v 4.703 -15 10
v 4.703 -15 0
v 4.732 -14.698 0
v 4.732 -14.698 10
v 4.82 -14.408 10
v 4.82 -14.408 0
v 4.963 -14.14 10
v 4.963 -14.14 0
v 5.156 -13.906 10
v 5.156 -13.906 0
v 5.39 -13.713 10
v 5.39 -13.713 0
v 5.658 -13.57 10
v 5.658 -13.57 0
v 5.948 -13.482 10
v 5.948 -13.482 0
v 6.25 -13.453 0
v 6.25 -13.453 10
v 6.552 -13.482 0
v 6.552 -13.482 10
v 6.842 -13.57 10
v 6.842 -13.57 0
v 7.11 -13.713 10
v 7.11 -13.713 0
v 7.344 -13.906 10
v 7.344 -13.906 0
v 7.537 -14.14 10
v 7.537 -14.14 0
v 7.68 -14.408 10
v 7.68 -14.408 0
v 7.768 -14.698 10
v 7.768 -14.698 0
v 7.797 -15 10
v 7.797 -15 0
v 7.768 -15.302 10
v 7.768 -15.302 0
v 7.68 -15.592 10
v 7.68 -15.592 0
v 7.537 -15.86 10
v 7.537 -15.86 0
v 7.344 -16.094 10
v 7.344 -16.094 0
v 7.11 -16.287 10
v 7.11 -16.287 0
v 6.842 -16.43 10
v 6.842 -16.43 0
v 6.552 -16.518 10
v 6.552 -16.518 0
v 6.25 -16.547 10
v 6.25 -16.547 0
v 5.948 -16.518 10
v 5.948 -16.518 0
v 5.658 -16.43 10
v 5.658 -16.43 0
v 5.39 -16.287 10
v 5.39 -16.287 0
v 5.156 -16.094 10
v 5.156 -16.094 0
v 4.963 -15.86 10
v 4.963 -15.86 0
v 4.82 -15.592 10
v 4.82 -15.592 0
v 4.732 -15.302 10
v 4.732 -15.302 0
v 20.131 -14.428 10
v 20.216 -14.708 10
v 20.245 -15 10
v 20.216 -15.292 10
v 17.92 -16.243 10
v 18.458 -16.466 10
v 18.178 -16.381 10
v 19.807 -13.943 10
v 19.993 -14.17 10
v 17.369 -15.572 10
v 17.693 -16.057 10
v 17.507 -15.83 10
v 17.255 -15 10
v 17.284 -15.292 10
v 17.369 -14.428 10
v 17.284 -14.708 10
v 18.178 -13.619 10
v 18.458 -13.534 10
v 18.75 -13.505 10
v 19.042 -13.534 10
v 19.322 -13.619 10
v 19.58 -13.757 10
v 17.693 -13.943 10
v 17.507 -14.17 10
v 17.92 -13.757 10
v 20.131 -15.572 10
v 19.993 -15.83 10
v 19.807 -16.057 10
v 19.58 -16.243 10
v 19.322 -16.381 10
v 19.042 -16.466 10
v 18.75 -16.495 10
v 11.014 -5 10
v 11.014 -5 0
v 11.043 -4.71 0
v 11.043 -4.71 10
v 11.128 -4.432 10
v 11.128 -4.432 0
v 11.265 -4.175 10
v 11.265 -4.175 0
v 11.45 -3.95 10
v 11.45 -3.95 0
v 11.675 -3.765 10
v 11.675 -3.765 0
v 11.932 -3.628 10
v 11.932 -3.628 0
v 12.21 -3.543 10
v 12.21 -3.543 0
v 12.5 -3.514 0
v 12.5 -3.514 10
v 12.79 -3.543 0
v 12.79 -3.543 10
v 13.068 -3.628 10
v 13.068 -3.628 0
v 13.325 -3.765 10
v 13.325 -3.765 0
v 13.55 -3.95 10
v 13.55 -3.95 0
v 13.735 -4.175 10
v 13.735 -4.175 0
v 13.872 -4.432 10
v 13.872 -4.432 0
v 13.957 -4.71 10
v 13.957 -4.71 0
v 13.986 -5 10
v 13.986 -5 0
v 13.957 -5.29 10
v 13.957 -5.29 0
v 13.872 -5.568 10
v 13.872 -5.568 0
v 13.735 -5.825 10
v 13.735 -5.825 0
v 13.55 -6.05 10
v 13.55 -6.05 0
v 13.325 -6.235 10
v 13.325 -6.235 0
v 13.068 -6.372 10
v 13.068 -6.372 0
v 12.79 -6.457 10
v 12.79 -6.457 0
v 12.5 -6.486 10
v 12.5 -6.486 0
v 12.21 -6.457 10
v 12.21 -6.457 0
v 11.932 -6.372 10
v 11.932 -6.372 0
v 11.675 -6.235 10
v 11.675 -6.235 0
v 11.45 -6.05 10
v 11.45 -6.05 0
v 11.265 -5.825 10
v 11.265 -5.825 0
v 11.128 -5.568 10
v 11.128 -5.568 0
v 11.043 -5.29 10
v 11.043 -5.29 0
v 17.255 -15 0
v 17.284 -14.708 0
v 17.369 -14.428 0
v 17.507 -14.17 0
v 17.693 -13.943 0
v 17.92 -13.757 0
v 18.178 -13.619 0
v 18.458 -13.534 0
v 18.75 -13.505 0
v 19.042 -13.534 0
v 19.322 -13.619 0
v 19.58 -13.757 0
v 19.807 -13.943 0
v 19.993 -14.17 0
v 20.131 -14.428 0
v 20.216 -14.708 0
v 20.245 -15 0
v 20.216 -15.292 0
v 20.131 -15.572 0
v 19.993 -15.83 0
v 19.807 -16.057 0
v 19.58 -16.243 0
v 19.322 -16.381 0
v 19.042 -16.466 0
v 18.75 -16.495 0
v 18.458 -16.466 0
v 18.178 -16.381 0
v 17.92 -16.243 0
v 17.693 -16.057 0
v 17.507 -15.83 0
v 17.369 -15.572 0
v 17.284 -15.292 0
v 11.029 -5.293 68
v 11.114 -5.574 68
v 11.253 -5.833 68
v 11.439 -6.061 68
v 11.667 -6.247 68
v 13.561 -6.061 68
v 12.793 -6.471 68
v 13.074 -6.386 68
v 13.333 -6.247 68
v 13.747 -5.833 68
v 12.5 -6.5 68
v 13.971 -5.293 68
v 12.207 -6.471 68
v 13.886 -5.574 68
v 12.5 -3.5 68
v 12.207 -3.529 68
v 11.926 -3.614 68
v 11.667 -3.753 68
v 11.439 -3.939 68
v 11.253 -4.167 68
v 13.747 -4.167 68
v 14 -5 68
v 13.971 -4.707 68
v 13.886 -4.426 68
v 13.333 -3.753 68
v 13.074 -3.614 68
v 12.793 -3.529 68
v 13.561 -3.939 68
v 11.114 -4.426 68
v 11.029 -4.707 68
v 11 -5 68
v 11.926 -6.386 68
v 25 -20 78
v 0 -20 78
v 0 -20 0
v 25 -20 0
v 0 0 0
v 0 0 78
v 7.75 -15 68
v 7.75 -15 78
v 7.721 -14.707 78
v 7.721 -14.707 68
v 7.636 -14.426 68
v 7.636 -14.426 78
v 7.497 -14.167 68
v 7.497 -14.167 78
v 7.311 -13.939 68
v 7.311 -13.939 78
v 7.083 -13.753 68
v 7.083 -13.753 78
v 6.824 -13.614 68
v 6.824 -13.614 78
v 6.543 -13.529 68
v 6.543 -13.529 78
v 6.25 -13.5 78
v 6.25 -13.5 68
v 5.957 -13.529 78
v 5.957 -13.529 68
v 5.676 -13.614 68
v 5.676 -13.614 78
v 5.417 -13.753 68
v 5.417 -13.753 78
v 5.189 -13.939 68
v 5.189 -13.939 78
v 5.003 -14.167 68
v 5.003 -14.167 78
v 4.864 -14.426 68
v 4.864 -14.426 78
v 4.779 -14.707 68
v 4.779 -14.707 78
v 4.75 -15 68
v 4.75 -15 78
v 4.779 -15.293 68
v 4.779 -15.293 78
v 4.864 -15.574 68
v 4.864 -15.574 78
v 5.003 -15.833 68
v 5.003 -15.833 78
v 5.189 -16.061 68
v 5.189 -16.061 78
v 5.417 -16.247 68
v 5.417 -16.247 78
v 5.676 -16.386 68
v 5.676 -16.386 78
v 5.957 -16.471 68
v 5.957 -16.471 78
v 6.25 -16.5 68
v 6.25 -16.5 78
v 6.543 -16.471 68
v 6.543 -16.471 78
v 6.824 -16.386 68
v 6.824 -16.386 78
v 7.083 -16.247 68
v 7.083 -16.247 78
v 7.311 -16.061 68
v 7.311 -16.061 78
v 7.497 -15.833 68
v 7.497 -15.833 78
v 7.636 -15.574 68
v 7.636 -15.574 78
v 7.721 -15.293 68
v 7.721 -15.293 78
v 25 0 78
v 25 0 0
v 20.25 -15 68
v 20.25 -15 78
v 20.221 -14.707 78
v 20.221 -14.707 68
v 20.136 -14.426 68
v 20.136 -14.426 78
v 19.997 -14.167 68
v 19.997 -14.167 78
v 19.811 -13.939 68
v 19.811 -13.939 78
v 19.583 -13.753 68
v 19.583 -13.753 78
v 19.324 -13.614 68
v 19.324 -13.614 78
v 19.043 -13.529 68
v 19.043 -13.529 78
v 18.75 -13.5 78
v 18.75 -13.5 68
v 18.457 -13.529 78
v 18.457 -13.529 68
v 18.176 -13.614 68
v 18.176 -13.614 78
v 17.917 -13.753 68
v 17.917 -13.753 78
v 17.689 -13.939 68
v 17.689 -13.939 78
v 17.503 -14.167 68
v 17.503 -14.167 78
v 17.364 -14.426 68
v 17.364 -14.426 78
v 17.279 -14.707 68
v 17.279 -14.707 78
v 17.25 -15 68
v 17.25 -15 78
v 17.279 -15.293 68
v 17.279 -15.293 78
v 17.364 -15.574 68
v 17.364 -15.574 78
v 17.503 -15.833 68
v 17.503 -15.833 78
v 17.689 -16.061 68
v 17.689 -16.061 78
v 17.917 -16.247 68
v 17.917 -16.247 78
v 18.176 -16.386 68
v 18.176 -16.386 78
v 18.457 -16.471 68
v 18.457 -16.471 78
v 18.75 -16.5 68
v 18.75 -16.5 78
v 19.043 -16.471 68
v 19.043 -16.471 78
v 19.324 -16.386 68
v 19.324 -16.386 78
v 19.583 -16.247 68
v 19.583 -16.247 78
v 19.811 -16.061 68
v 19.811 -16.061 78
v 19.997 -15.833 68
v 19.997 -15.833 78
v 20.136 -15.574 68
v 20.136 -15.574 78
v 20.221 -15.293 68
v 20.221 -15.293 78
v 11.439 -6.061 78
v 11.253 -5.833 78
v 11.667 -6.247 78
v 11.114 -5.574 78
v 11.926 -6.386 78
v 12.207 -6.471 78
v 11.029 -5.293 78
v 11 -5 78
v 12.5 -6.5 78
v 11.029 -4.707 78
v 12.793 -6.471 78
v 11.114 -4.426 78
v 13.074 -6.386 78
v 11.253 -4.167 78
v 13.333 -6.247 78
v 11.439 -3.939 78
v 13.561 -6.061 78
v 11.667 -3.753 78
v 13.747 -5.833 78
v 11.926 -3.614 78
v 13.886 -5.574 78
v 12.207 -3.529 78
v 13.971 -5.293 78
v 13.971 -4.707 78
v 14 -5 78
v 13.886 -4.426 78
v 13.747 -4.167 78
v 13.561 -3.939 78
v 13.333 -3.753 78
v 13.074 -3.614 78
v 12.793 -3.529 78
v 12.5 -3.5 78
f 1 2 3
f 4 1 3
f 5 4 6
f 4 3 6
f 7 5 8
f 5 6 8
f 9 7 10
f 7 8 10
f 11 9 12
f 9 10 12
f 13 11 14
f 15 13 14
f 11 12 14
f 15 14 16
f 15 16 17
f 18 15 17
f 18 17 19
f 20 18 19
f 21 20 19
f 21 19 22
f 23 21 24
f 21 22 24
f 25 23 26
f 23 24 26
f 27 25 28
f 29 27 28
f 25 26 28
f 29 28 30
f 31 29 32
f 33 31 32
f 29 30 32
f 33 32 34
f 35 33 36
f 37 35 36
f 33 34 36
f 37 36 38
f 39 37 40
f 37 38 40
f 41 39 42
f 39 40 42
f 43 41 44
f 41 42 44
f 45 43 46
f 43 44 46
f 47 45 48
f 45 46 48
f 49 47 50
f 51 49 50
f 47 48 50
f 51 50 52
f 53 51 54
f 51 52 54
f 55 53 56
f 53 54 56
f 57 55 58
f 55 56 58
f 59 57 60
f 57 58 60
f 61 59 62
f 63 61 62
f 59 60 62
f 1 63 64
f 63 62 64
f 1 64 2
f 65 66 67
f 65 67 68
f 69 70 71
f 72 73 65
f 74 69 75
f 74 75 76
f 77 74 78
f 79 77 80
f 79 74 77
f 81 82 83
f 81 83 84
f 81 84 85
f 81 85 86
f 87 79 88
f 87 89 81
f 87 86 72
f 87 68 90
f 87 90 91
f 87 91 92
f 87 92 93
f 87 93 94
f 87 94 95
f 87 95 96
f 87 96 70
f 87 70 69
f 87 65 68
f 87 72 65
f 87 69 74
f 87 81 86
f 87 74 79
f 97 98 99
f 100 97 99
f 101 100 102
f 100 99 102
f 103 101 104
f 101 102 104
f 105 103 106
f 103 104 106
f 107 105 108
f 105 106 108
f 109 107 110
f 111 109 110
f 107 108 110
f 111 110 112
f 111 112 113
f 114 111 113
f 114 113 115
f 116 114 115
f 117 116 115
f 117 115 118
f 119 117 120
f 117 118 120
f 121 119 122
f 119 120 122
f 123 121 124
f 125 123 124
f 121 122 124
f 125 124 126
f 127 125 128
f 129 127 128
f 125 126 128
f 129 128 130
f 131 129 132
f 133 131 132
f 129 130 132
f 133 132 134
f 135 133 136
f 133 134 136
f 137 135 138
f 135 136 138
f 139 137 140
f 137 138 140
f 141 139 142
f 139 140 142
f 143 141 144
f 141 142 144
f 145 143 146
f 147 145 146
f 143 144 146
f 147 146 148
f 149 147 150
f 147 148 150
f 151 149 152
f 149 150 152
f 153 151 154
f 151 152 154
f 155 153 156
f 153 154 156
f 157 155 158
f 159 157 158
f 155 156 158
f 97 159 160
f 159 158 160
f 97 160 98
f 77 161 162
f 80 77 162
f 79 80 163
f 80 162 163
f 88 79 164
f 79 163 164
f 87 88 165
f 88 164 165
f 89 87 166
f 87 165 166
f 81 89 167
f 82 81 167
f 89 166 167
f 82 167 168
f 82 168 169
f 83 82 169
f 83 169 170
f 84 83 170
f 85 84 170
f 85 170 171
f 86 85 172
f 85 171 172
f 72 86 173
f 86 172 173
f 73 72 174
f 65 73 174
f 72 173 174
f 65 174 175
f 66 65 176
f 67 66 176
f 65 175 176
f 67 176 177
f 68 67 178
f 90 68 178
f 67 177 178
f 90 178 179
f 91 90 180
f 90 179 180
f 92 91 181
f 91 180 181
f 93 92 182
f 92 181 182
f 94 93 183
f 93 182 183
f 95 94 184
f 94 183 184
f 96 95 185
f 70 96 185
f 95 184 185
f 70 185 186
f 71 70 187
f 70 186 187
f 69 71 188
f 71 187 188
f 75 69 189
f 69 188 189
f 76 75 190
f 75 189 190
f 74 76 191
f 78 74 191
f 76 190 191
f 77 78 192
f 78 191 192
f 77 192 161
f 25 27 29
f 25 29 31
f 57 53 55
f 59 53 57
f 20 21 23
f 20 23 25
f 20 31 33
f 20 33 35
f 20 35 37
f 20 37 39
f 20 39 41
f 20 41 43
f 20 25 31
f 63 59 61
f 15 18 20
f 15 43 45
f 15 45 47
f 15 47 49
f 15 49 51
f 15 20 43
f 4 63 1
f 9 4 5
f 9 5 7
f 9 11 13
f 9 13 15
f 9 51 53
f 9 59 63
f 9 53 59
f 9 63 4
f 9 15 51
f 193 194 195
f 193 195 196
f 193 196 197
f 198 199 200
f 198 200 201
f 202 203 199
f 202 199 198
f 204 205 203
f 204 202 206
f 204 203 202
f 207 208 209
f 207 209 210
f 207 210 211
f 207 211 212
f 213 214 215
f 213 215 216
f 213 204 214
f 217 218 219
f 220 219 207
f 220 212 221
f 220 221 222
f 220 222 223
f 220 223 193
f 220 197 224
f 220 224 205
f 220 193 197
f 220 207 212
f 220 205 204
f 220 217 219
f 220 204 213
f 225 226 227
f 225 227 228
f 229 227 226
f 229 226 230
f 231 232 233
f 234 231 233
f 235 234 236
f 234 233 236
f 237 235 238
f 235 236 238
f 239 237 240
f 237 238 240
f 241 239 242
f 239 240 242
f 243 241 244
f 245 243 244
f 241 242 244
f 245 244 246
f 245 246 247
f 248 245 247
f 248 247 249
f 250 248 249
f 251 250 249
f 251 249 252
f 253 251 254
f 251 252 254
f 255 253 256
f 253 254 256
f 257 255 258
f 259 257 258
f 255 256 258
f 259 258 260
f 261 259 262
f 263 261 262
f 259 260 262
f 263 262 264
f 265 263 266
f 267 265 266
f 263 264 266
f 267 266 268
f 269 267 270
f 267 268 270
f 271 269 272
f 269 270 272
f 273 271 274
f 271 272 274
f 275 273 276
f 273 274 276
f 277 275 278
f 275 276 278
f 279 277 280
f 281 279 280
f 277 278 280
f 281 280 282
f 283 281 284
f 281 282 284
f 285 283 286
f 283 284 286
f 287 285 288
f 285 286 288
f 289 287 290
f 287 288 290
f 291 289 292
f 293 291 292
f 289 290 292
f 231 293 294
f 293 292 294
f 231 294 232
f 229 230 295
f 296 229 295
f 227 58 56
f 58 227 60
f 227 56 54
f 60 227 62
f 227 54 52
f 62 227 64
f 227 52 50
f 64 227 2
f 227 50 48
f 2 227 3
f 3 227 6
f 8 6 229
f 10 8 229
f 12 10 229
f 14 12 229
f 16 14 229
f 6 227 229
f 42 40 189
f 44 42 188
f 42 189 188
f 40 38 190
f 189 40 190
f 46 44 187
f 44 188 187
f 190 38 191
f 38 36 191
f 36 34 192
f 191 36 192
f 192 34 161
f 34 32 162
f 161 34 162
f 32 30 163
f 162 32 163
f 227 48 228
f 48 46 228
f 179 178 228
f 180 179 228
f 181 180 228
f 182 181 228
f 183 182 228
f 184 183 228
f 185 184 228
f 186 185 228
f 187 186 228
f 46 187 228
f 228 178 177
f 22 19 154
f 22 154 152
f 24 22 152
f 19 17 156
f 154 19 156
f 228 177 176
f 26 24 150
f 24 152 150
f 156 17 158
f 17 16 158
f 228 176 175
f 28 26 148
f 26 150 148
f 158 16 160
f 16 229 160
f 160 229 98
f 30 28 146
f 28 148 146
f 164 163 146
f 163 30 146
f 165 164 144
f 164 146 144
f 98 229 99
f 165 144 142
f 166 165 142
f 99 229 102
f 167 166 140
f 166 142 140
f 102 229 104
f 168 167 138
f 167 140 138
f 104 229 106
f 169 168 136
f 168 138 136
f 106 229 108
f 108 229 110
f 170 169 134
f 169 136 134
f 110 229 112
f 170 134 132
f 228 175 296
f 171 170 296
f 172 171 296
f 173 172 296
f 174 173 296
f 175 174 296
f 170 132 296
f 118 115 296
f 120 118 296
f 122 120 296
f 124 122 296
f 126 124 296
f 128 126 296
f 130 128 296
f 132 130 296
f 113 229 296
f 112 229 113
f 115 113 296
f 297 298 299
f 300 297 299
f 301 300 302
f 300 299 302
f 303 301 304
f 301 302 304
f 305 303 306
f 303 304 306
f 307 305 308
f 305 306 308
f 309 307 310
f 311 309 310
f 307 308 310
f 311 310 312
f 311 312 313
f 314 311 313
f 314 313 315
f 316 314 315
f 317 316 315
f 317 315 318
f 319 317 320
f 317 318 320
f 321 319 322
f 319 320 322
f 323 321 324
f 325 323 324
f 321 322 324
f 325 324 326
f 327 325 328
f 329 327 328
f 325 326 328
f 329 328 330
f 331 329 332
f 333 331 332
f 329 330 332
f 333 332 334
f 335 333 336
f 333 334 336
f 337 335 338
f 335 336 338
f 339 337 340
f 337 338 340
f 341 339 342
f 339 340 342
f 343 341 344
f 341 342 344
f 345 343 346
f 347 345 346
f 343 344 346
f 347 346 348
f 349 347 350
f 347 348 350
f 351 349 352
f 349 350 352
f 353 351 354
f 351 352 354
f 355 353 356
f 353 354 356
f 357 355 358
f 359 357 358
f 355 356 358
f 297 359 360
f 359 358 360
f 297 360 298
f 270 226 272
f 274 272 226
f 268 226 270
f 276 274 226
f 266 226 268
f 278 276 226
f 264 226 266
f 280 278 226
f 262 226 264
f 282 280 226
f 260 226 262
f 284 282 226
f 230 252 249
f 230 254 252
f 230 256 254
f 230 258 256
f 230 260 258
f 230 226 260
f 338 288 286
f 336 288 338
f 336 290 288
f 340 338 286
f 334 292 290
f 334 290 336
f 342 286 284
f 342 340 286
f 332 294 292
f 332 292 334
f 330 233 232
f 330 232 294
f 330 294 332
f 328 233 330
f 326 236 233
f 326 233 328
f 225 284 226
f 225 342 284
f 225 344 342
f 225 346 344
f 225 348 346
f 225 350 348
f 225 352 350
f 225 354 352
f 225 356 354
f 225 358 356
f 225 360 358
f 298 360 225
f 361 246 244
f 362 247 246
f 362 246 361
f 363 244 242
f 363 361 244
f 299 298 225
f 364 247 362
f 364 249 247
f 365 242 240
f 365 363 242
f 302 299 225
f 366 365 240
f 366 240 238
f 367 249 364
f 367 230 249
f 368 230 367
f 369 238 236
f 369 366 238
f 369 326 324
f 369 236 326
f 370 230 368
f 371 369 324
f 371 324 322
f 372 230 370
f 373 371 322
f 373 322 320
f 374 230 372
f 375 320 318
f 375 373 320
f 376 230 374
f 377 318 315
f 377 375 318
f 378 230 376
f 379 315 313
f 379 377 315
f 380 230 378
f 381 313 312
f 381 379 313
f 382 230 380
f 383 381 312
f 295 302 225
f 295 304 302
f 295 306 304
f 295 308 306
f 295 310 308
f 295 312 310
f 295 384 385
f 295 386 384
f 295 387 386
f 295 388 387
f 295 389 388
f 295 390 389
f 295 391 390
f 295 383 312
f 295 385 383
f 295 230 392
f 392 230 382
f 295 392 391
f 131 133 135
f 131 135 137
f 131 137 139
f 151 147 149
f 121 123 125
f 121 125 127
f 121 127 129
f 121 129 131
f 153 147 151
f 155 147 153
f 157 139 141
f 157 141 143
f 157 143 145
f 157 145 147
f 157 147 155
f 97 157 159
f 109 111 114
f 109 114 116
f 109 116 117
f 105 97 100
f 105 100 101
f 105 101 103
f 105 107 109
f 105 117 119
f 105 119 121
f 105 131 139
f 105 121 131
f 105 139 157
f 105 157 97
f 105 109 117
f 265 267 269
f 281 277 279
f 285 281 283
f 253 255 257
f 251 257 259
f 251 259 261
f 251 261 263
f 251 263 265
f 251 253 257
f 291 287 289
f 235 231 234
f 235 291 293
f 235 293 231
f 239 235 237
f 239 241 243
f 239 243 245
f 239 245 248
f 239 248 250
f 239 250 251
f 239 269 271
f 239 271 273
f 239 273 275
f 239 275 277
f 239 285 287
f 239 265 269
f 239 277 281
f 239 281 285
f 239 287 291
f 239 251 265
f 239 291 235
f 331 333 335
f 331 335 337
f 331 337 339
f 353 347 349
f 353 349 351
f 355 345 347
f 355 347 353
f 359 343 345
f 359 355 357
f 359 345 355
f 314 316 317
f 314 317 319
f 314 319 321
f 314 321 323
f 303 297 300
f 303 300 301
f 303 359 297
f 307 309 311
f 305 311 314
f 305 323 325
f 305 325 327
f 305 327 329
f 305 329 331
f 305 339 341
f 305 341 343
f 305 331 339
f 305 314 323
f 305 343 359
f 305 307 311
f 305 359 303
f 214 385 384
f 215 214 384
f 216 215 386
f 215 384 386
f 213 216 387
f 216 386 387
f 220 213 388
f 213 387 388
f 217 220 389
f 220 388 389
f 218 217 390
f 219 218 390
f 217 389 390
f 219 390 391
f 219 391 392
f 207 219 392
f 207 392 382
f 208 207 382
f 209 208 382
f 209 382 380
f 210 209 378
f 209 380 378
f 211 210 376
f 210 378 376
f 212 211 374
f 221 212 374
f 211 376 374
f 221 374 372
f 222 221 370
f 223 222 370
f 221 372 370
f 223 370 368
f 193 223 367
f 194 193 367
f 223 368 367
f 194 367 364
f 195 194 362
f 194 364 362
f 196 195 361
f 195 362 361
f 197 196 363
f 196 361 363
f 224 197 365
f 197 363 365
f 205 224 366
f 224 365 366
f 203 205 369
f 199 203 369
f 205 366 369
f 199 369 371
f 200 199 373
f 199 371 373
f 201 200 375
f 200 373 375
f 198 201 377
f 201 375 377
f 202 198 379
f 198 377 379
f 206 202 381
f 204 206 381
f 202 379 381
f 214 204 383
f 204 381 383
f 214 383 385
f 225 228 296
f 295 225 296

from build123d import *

# Parameters (mm, degrees)
SKETCH1_W           = 25
SKETCH1_H           = 20
BOSS_EXTRUDE2_DEPTH = 78
SKETCH3_R           = 1.5
CUT_EXTRUDE2_DEPTH  = 10
SKETCH6_R           = 1.485523147
SKETCH6_R_2         = 1.547360616
SKETCH6_R_3         = 1.494600316
CUT_EXTRUDE3_DEPTH  = 10


with BuildPart() as part:
    # Sketch1 → Boss-Extrude2 (new body)
    with BuildSketch(Plane.XY):
        with Locations((12.5, -10)):
            Rectangle(SKETCH1_W, SKETCH1_H)
    extrude(amount=BOSS_EXTRUDE2_DEPTH)

    # Sketch3 → Cut-Extrude2 (cut)
    with BuildSketch(Plane.XY.offset(78)):
        with Locations((6.25, -15)):
            Circle(SKETCH3_R)
        with Locations((12.5, -5)):
            Circle(SKETCH3_R)
        with Locations((18.75, -15)):
            Circle(SKETCH3_R)
    extrude(amount=-CUT_EXTRUDE2_DEPTH, mode=Mode.SUBTRACT)

    # Sketch6 → Cut-Extrude3 (cut)
    with BuildSketch(Plane(origin=(0, 0, 0), x_dir=(-1, 0, 0), z_dir=(0, 0, -1))):
        with Locations((-12.5, -5)):
            Circle(SKETCH6_R)
        with Locations((-6.25, -15)):
            Circle(SKETCH6_R_2)
        with Locations((-18.75, -15)):
            Circle(SKETCH6_R_3)
    extrude(amount=-CUT_EXTRUDE3_DEPTH, mode=Mode.SUBTRACT)


solid = part.part
